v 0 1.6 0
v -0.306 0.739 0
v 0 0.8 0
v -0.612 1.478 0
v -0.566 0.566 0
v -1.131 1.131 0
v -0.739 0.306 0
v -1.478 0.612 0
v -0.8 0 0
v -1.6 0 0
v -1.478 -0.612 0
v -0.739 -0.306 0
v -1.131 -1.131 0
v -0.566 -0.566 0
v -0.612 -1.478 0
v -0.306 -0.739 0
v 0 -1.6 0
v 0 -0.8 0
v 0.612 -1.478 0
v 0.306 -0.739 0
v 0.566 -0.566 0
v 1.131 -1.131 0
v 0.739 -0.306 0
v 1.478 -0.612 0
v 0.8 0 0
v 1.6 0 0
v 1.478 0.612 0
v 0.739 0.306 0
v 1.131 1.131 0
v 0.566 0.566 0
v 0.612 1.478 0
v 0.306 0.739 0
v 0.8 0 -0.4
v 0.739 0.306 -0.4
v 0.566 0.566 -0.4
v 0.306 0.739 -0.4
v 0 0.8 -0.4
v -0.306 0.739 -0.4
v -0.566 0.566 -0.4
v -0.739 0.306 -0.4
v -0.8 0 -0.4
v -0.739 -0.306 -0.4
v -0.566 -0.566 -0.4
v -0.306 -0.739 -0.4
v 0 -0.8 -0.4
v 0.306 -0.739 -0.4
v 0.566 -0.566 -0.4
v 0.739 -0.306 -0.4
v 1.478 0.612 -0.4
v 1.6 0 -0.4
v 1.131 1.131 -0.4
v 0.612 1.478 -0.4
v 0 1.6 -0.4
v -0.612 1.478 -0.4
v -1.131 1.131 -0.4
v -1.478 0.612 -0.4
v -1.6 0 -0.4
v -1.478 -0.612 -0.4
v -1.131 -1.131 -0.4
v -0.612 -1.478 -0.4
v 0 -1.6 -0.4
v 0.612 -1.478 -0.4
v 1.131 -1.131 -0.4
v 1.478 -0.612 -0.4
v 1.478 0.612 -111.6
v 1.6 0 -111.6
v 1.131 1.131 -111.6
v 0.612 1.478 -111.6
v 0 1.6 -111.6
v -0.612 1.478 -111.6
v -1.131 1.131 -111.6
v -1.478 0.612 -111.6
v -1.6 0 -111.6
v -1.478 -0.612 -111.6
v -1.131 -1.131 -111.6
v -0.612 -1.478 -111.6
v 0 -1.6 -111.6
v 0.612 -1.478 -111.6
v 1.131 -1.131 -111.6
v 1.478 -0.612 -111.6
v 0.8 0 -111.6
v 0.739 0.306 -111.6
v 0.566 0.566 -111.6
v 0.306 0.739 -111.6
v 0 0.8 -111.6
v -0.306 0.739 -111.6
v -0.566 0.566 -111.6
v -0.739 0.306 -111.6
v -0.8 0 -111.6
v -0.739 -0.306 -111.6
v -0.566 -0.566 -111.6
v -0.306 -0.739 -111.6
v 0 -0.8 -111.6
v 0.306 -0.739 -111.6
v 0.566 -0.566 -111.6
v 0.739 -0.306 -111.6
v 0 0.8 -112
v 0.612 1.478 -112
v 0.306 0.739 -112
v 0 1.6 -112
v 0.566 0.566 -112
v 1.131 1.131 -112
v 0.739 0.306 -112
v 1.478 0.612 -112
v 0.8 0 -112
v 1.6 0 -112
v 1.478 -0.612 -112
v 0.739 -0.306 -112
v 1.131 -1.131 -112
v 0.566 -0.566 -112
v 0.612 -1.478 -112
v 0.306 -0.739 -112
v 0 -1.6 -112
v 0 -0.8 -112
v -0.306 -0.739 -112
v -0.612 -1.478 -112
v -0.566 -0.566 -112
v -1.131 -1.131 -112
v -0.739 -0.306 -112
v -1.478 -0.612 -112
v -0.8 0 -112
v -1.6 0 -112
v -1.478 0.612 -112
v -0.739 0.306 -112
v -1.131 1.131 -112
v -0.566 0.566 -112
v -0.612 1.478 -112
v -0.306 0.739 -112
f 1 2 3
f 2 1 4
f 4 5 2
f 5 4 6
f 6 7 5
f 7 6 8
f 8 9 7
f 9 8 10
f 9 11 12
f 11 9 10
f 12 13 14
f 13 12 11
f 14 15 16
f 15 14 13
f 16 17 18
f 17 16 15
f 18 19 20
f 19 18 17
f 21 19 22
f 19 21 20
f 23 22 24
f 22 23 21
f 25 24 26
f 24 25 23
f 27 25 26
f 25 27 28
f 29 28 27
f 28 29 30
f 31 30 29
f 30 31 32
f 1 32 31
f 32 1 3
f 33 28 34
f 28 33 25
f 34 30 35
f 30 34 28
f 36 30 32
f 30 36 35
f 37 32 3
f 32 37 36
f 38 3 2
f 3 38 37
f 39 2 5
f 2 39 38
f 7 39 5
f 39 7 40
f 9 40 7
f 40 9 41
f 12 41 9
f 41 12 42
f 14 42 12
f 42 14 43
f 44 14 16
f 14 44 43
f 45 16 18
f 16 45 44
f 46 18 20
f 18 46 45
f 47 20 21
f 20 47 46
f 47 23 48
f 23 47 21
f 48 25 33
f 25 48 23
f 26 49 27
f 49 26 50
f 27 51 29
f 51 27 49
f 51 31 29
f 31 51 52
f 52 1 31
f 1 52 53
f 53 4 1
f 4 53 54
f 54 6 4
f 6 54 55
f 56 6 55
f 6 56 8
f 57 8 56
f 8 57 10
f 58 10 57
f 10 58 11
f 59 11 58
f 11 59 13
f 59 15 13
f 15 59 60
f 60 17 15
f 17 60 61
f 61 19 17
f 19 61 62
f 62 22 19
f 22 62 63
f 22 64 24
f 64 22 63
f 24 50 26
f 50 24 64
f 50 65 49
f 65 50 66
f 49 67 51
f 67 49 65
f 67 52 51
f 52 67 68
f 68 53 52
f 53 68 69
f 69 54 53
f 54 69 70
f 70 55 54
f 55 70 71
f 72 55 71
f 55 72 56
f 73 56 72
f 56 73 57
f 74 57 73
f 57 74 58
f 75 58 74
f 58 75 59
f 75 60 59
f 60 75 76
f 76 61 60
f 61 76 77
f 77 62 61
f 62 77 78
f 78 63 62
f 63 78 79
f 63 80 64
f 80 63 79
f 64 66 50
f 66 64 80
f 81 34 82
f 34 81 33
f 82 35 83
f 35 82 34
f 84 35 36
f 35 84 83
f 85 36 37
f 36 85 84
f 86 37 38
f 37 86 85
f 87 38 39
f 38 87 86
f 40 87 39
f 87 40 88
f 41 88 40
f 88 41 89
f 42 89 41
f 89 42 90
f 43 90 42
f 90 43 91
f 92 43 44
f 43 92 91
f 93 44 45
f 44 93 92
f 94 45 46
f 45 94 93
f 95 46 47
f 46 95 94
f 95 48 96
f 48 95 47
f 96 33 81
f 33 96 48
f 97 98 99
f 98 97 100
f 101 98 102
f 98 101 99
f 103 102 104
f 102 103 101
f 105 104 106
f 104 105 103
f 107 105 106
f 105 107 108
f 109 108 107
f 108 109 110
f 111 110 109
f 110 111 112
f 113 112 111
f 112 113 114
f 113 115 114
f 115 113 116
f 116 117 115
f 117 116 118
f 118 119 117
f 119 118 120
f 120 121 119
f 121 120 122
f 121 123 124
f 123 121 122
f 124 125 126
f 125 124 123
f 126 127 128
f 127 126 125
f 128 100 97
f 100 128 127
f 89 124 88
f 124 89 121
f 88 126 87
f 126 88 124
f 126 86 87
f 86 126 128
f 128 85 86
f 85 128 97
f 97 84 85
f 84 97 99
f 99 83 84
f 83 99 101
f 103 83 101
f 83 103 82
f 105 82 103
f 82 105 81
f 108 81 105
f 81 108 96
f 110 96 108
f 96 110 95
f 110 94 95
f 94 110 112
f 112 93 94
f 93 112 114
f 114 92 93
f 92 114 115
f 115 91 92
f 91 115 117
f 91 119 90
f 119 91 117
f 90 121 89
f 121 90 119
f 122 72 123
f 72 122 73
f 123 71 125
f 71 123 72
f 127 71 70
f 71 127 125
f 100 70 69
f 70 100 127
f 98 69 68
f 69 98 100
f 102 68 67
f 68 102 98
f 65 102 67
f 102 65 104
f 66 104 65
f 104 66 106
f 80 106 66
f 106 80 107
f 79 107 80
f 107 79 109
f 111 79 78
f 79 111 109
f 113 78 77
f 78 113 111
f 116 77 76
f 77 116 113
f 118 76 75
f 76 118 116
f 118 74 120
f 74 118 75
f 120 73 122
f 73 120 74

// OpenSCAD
// file: ../p/4-4ring1.scad
use <../lib.scad>
function ldraw_lib__4_4ring1() = [
// 0 Ring  1 x 1.0
// 0 Name: 4-4ring1.dat
// 0 Author: James Jessiman
// 0 !LDRAW_ORG Primitive UPDATE 2009-01
// 0 !LICENSE Licensed under CC BY 4.0 : see CAreadme.txt
// 
// 0 BFC CERTIFY CCW
  [0,"BFC","CERTIFY"],
  [0,"BFC","CCW"],
// 
// 0 !HISTORY 1998-12-15 [PTadmin] Official Update 1998-10
// 0 !HISTORY 2002-04-08 [BrickCaster] Modified for BFC compliance
// 0 !HISTORY 2002-04-25 [PTadmin] Official Update 2002-02
// 0 !HISTORY 2007-06-24 [PTadmin] Header formatted for Contributor Agreement
// 0 !HISTORY 2008-07-01 [PTadmin] Official Update 2008-01
// 0 !HISTORY 2008-08-26 [cwdee] Switch polygon winding and rename
// 0 !HISTORY 2009-05-02 [PTadmin] Official Update 2009-01
// 
// 
// 4 16 -0.7654 0 1.8478 -0.3827 0 0.9239 0 0 1 0 0 2
  [4,16,-0.7654,0,1.8478,-0.3827,0,0.9239,0,0,1,0,0,2],
// 4 16 -1.4142 0 1.4142 -0.7071 0 0.7071 -0.3827 0 0.9239 -0.7654 0 1.8478
  [4,16,-1.4142,0,1.4142,-0.7071,0,0.7071,-0.3827,0,0.9239,-0.7654,0,1.8478],
// 4 16 -1.8478 0 0.7654 -0.9239 0 0.3827 -0.7071 0 0.7071 -1.4142 0 1.41420
  [4,16,-1.8478,0,0.7654,-0.9239,0,0.3827,-0.7071,0,0.7071,-1.4142,0,1.41420],
// 4 16 -2 0 0 -1 0 0 -0.9239 0 0.3827 -1.8478 0 0.7654
  [4,16,-2,0,0,-1,0,0,-0.9239,0,0.3827,-1.8478,0,0.7654],
// 4 16 -1.8478 0 -0.7654 -0.9239 0 -0.3827 -1 0 0 -2 0 0
  [4,16,-1.8478,0,-0.7654,-0.9239,0,-0.3827,-1,0,0,-2,0,0],
// 4 16 -1.4142 0 -1.4142 -0.7071 0 -0.7071 -0.9239 0 -0.3827 -1.8478 0 -0.7654
  [4,16,-1.4142,0,-1.4142,-0.7071,0,-0.7071,-0.9239,0,-0.3827,-1.8478,0,-0.7654],
// 4 16 -0.7654 0 -1.8478 -0.3827 0 -0.9239 -0.7071 0 -0.7071 -1.4142 0 -1.4142
  [4,16,-0.7654,0,-1.8478,-0.3827,0,-0.9239,-0.7071,0,-0.7071,-1.4142,0,-1.4142],
// 4 16 0 0 -2 0 0 -1 -0.3827 0 -0.9239 -0.7654 0 -1.8478
  [4,16,0,0,-2,0,0,-1,-0.3827,0,-0.9239,-0.7654,0,-1.8478],
// 4 16 0.7654 0 -1.8478 0.3827 0 -0.9239 0 0 -1 0 0 -2
  [4,16,0.7654,0,-1.8478,0.3827,0,-0.9239,0,0,-1,0,0,-2],
// 4 16 1.4142 0 -1.4142 0.7071 0 -0.7071 0.3827 0 -0.9239 0.7654 0 -1.8478
  [4,16,1.4142,0,-1.4142,0.7071,0,-0.7071,0.3827,0,-0.9239,0.7654,0,-1.8478],
// 4 16 1.8478 0 -0.7654 0.9239 0 -0.3827 0.7071 0 -0.7071 1.4142 0 -1.4142
  [4,16,1.8478,0,-0.7654,0.9239,0,-0.3827,0.7071,0,-0.7071,1.4142,0,-1.4142],
// 4 16 2 0 0 1 0 0 0.9239 0 -0.3827 1.8478 0 -0.7654
  [4,16,2,0,0,1,0,0,0.9239,0,-0.3827,1.8478,0,-0.7654],
// 4 16 1.8478 0 0.7654 0.9239 0 0.3827 1 0 0 2 0 0
  [4,16,1.8478,0,0.7654,0.9239,0,0.3827,1,0,0,2,0,0],
// 4 16 1.4142 0 1.4142 0.7071 0 0.7071 0.9239 0 0.3827 1.8478 0 0.7654
  [4,16,1.4142,0,1.4142,0.7071,0,0.7071,0.9239,0,0.3827,1.8478,0,0.7654],
// 4 16 0.7654 0 1.8478 0.3827 0 0.9239 0.7071 0 0.7071 1.4142 0 1.4142
  [4,16,0.7654,0,1.8478,0.3827,0,0.9239,0.7071,0,0.7071,1.4142,0,1.4142],
// 4 16 0 0 2 0 0 1 0.3827 0 0.9239 0.7654 0 1.8478
  [4,16,0,0,2,0,0,1,0.3827,0,0.9239,0.7654,0,1.8478],
// 0
];
module ldraw_lib__4_4ring1(step=0, col=false, unit=2/5, alt=false, line=0.2, solid=!$preview)
    makepoly(ldraw_lib__4_4ring1(), step=step, col=col, unit=unit, alt=alt, line=line, solid=solid);
ldraw_lib__4_4ring1(line=0.2);
// file: ../p/4-4edge.scad
use <../lib.scad>
function ldraw_lib__4_4edge() = [
// 0 Circle 1.0
// 0 Name: 4-4edge.dat
// 0 Author: James Jessiman
// 0 !LDRAW_ORG Primitive UPDATE 2017-01
// 0 !LICENSE Licensed under CC BY 4.0 : see CAreadme.txt
// 
// 0 BFC CERTIFY CCW
  [0,"BFC","CERTIFY"],
  [0,"BFC","CCW"],
// 
// 0 !HISTORY 1998-12-15 [PTadmin] Official Update 1998-10
// 0 !HISTORY 2005-12-28 [PTadmin] Official Update 2005-01
// 0 !HISTORY 2007-06-24 [PTadmin] Header formatted for Contributor Agreement
// 0 !HISTORY 2008-07-01 [PTadmin] Official Update 2008-01
// 0 !HISTORY 2017-01-15 [Steffen] BFCed
// 0 !HISTORY 2017-12-30 [PTadmin] Official Update 2017-01
// 
// 
// 2 24 1 0 0 0.9239 0 0.3827
  [2,24,1,0,0,0.9239,0,0.3827],
// 2 24 0.9239 0 0.3827 0.7071 0 0.7071
  [2,24,0.9239,0,0.3827,0.7071,0,0.7071],
// 2 24 0.7071 0 0.7071 0.3827 0 0.9239
  [2,24,0.7071,0,0.7071,0.3827,0,0.9239],
// 2 24 0.3827 0 0.9239 0 0 1
  [2,24,0.3827,0,0.9239,0,0,1],
// 2 24 0 0 1 -0.3827 0 0.9239
  [2,24,0,0,1,-0.3827,0,0.9239],
// 2 24 -0.3827 0 0.9239 -0.7071 0 0.7071
  [2,24,-0.3827,0,0.9239,-0.7071,0,0.7071],
// 2 24 -0.7071 0 0.7071 -0.9239 0 0.3827
  [2,24,-0.7071,0,0.7071,-0.9239,0,0.3827],
// 2 24 -0.9239 0 0.3827 -1 0 -0
  [2,24,-0.9239,0,0.3827,-1,0,-0],
// 2 24 -1 0 -0 -0.9239 0 -0.3827
  [2,24,-1,0,-0,-0.9239,0,-0.3827],
// 2 24 -0.9239 0 -0.3827 -0.7071 0 -0.7071
  [2,24,-0.9239,0,-0.3827,-0.7071,0,-0.7071],
// 2 24 -0.7071 0 -0.7071 -0.3827 0 -0.9239
  [2,24,-0.7071,0,-0.7071,-0.3827,0,-0.9239],
// 2 24 -0.3827 0 -0.9239 0 0 -1
  [2,24,-0.3827,0,-0.9239,0,0,-1],
// 2 24 0 0 -1 0.3827 0 -0.9239
  [2,24,0,0,-1,0.3827,0,-0.9239],
// 2 24 0.3827 0 -0.9239 0.7071 0 -0.7071
  [2,24,0.3827,0,-0.9239,0.7071,0,-0.7071],
// 2 24 0.7071 0 -0.7071 0.9239 0 -0.3827
  [2,24,0.7071,0,-0.7071,0.9239,0,-0.3827],
// 2 24 0.9239 0 -0.3827 1 0 0
  [2,24,0.9239,0,-0.3827,1,0,0],
];
module ldraw_lib__4_4edge(step=0, col=false, unit=2/5, alt=false, line=0.2, solid=!$preview)
    makepoly(ldraw_lib__4_4edge(), step=step, col=col, unit=unit, alt=alt, line=line, solid=solid);
ldraw_lib__4_4edge(line=0.2);
// file: ../p/4-4cyli.scad
use <../lib.scad>
function ldraw_lib__4_4cyli() = [
// 0 Cylinder 1.0
// 0 Name: 4-4cyli.dat
// 0 Author: James Jessiman
// 0 !LDRAW_ORG Primitive UPDATE 2005-01
// 0 !LICENSE Licensed under CC BY 4.0 : see CAreadme.txt
// 
// 0 BFC CERTIFY CCW
  [0,"BFC","CERTIFY"],
  [0,"BFC","CCW"],
// 
// 0 !HISTORY 1998-12-15 [PTadmin] Official Update 1998-10
// 0 !HISTORY 2002-03-23 [sbliss] Added BFC statement; merged headers from files in distributions LDraw 0.27 and Complete.
// 0 !HISTORY 2002-04-25 [PTadmin] Official Update 2002-02
// 0 !HISTORY 2004-12-14 [guyvivan] BFC CCW
// 0 !HISTORY 2005-12-28 [PTadmin] Official Update 2005-01
// 0 !HISTORY 2007-06-24 [PTadmin] Header formatted for Contributor Agreement
// 0 !HISTORY 2008-07-01 [PTadmin] Official Update 2008-01
// 
// 
// 4 16 1 1 0 0.9239 1 0.3827 0.9239 0 0.3827 1 0 0
  [4,16,1,1,0,0.9239,1,0.3827,0.9239,0,0.3827,1,0,0],
// 5 24 1 0 0 1 1 0 0.9239 0 0.3827 0.9239 0 -0.3827
  [5,24,1,0,0,1,1,0,0.9239,0,0.3827,0.9239,0,-0.3827],
// 4 16 0.9239 1 0.3827 0.7071 1 0.7071 0.7071 0 0.7071 0.9239 0 0.3827
  [4,16,0.9239,1,0.3827,0.7071,1,0.7071,0.7071,0,0.7071,0.9239,0,0.3827],
// 5 24 0.9239 0 0.3827 0.9239 1 0.3827 0.7071 0 0.7071 1 0 0
  [5,24,0.9239,0,0.3827,0.9239,1,0.3827,0.7071,0,0.7071,1,0,0],
// 4 16 0.7071 1 0.7071 0.3827 1 0.9239 0.3827 0 0.9239 0.7071 0 0.7071
  [4,16,0.7071,1,0.7071,0.3827,1,0.9239,0.3827,0,0.9239,0.7071,0,0.7071],
// 5 24 0.7071 0 0.7071 0.7071 1 0.7071 0.3827 0 0.9239 0.9239 0 0.3827
  [5,24,0.7071,0,0.7071,0.7071,1,0.7071,0.3827,0,0.9239,0.9239,0,0.3827],
// 4 16 0.3827 1 0.9239 0 1 1 0 0 1 0.3827 0 0.9239
  [4,16,0.3827,1,0.9239,0,1,1,0,0,1,0.3827,0,0.9239],
// 5 24 0.3827 0 0.9239 0.3827 1 0.9239 0 0 1 0.7071 0 0.7071
  [5,24,0.3827,0,0.9239,0.3827,1,0.9239,0,0,1,0.7071,0,0.7071],
// 4 16 0 1 1 -0.3827 1 0.9239 -0.3827 0 0.9239 0 0 1
  [4,16,0,1,1,-0.3827,1,0.9239,-0.3827,0,0.9239,0,0,1],
// 5 24 0 0 1 0 1 1 -0.3827 0 0.9239 0.3827 0 0.9239
  [5,24,0,0,1,0,1,1,-0.3827,0,0.9239,0.3827,0,0.9239],
// 4 16 -0.3827 1 0.9239 -0.7071 1 0.7071 -0.7071 0 0.7071 -0.3827 0 0.9239
  [4,16,-0.3827,1,0.9239,-0.7071,1,0.7071,-0.7071,0,0.7071,-0.3827,0,0.9239],
// 5 24 -0.3827 0 0.9239 -0.3827 1 0.9239 -0.7071 0 0.7071 0 0 1
  [5,24,-0.3827,0,0.9239,-0.3827,1,0.9239,-0.7071,0,0.7071,0,0,1],
// 4 16 -0.7071 1 0.7071 -0.9239 1 0.3827 -0.9239 0 0.3827 -0.7071 0 0.7071
  [4,16,-0.7071,1,0.7071,-0.9239,1,0.3827,-0.9239,0,0.3827,-0.7071,0,0.7071],
// 5 24 -0.7071 0 0.7071 -0.7071 1 0.7071 -0.9239 0 0.3827 -0.3827 0 0.9239
  [5,24,-0.7071,0,0.7071,-0.7071,1,0.7071,-0.9239,0,0.3827,-0.3827,0,0.9239],
// 4 16 -0.9239 1 0.3827 -1 1 0 -1 0 0 -0.9239 0 0.3827
  [4,16,-0.9239,1,0.3827,-1,1,0,-1,0,0,-0.9239,0,0.3827],
// 5 24 -0.9239 0 0.3827 -0.9239 1 0.3827 -1 0 0 -0.7071 0 0.7071
  [5,24,-0.9239,0,0.3827,-0.9239,1,0.3827,-1,0,0,-0.7071,0,0.7071],
// 4 16 -1 1 0 -0.9239 1 -0.3827 -0.9239 0 -0.3827 -1 0 0
  [4,16,-1,1,0,-0.9239,1,-0.3827,-0.9239,0,-0.3827,-1,0,0],
// 5 24 -1 0 0 -1 1 0 -0.9239 0 -0.3827 -0.9239 0 0.3827
  [5,24,-1,0,0,-1,1,0,-0.9239,0,-0.3827,-0.9239,0,0.3827],
// 4 16 -0.9239 1 -0.3827 -0.7071 1 -0.7071 -0.7071 0 -0.7071 -0.9239 0 -0.3827
  [4,16,-0.9239,1,-0.3827,-0.7071,1,-0.7071,-0.7071,0,-0.7071,-0.9239,0,-0.3827],
// 5 24 -0.9239 0 -0.3827 -0.9239 1 -0.3827 -0.7071 0 -0.7071 -1 0 0
  [5,24,-0.9239,0,-0.3827,-0.9239,1,-0.3827,-0.7071,0,-0.7071,-1,0,0],
// 4 16 -0.7071 1 -0.7071 -0.3827 1 -0.9239 -0.3827 0 -0.9239 -0.7071 0 -0.7071
  [4,16,-0.7071,1,-0.7071,-0.3827,1,-0.9239,-0.3827,0,-0.9239,-0.7071,0,-0.7071],
// 5 24 -0.7071 0 -0.7071 -0.7071 1 -0.7071 -0.3827 0 -0.9239 -0.9239 0 -0.3827
  [5,24,-0.7071,0,-0.7071,-0.7071,1,-0.7071,-0.3827,0,-0.9239,-0.9239,0,-0.3827],
// 4 16 -0.3827 1 -0.9239 0 1 -1 0 0 -1 -0.3827 0 -0.9239
  [4,16,-0.3827,1,-0.9239,0,1,-1,0,0,-1,-0.3827,0,-0.9239],
// 5 24 -0.3827 0 -0.9239 -0.3827 1 -0.9239 0 0 -1 -0.7071 0 -0.7071
  [5,24,-0.3827,0,-0.9239,-0.3827,1,-0.9239,0,0,-1,-0.7071,0,-0.7071],
// 4 16 0 1 -1 0.3827 1 -0.9239 0.3827 0 -0.9239 0 0 -1
  [4,16,0,1,-1,0.3827,1,-0.9239,0.3827,0,-0.9239,0,0,-1],
// 5 24 0 0 -1 0 1 -1 0.3827 0 -0.9239 -0.3827 0 -0.9239
  [5,24,0,0,-1,0,1,-1,0.3827,0,-0.9239,-0.3827,0,-0.9239],
// 4 16 0.3827 1 -0.9239 0.7071 1 -0.7071 0.7071 0 -0.7071 0.3827 0 -0.9239
  [4,16,0.3827,1,-0.9239,0.7071,1,-0.7071,0.7071,0,-0.7071,0.3827,0,-0.9239],
// 5 24 0.3827 0 -0.9239 0.3827 1 -0.9239 0.7071 0 -0.7071 0 0 -1
  [5,24,0.3827,0,-0.9239,0.3827,1,-0.9239,0.7071,0,-0.7071,0,0,-1],
// 4 16 0.7071 1 -0.7071 0.9239 1 -0.3827 0.9239 0 -0.3827 0.7071 0 -0.7071
  [4,16,0.7071,1,-0.7071,0.9239,1,-0.3827,0.9239,0,-0.3827,0.7071,0,-0.7071],
// 5 24 0.7071 0 -0.7071 0.7071 1 -0.7071 0.9239 0 -0.3827 0.3827 0 -0.9239
  [5,24,0.7071,0,-0.7071,0.7071,1,-0.7071,0.9239,0,-0.3827,0.3827,0,-0.9239],
// 4 16 0.9239 1 -0.3827 1 1 0 1 0 0 0.9239 0 -0.3827
  [4,16,0.9239,1,-0.3827,1,1,0,1,0,0,0.9239,0,-0.3827],
// 5 24 0.9239 0 -0.3827 0.9239 1 -0.3827 1 0 0 0.7071 0 -0.7071
  [5,24,0.9239,0,-0.3827,0.9239,1,-0.3827,1,0,0,0.7071,0,-0.7071],
// 0
];
module ldraw_lib__4_4cyli(step=0, col=false, unit=2/5, alt=false, line=0.2, solid=!$preview)
    makepoly(ldraw_lib__4_4cyli(), step=step, col=col, unit=unit, alt=alt, line=line, solid=solid);
ldraw_lib__4_4cyli(line=0.2);
// file: u9053.scad
use <../lib.scad>
use <../p/4-4cyli.scad>
use <../p/4-4edge.scad>
use <../p/4-4ring1.scad>
function ldraw_lib__u9053() = [
// 0 ~Technic Flex-System Hose End
// 0 Name: u9053.dat
// 0 Author: William Howard [WilliamH]
// 0 !LDRAW_ORG Part UPDATE 2011-02
// 0 !LICENSE Licensed under CC BY 2.0 and CC BY 4.0 : see CAreadme.txt
// 
// 0 BFC CERTIFY CCW
  [0,"BFC","CERTIFY"],
  [0,"BFC","CCW"],
// 
// 0 !HISTORY 2011-12-21 [cwdee] Reworked subparting technique
// 0 !HISTORY 2011-12-23 [PTadmin] Renamed from 76
// 0 !HISTORY 2011-12-29 [PTadmin] Official Update 2011-02
// 
// 
// 1 16 0 0 0 2 0 0 0 1 0 0 0 2 4-4ring1.dat
  [1,16,0,0,0,2,0,0,0,1,0,0,0,2, ldraw_lib__4_4ring1()],
// 1 16 0 0 0 2 0 0 0 1 0 0 0 2 4-4edge.dat
  [1,16,0,0,0,2,0,0,0,1,0,0,0,2, ldraw_lib__4_4edge()],
// 0 BFC INVERTNEXT
  [0,"BFC","INVERTNEXT"],
// 1 16 0 0 0 2 0 0 0 1 0 0 0 2 4-4cyli.dat
  [1,16,0,0,0,2,0,0,0,1,0,0,0,2, ldraw_lib__4_4cyli()],
// 1 16 0 0 0 4 0 0 0 1 0 0 0 4 4-4edge.dat
  [1,16,0,0,0,4,0,0,0,1,0,0,0,4, ldraw_lib__4_4edge()],
// 1 16 0 0 0 4 0 0 0 1 0 0 0 4 4-4cyli.dat
  [1,16,0,0,0,4,0,0,0,1,0,0,0,4, ldraw_lib__4_4cyli()],
// 0
];
module ldraw_lib__u9053(step=0, col=false, unit=2/5, alt=false, line=0.2, solid=!$preview)
    makepoly(ldraw_lib__u9053(), step=step, col=col, unit=unit, alt=alt, line=line, solid=solid);
ldraw_lib__u9053(line=0.2);
// file: 77.scad
use <../lib.scad>
use <../p/4-4cyli.scad>
function ldraw_lib__77() = [
// 0 ~Technic Flex-System Hose Segment
// 0 Name: 77.dat
// 0 Author: William Howard [WilliamH]
// 0 !LDRAW_ORG Part UPDATE 2011-02
// 0 !LICENSE Licensed under CC BY 2.0 and CC BY 4.0 : see CAreadme.txt
// 
// 0 BFC CERTIFY CCW
  [0,"BFC","CERTIFY"],
  [0,"BFC","CCW"],
// 
// 0 !HISTORY 2011-12-21 [cwdee] Reworked subparting technique
// 0 !HISTORY 2011-12-29 [PTadmin] Official Update 2011-02
// 
// 
// 1 16 0 0 0 4 0 0 0 1 0 0 0 4 4-4cyli.dat
  [1,16,0,0,0,4,0,0,0,1,0,0,0,4, ldraw_lib__4_4cyli()],
// 0 BFC INVERTNEXT
  [0,"BFC","INVERTNEXT"],
// 1 16 0 0 0 2 0 0 0 1 0 0 0 2 4-4cyli.dat
  [1,16,0,0,0,2,0,0,0,1,0,0,0,2, ldraw_lib__4_4cyli()],
// 0
];
module ldraw_lib__77(step=0, col=false, unit=2/5, alt=false, line=0.2, solid=!$preview)
    makepoly(ldraw_lib__77(), step=step, col=col, unit=unit, alt=alt, line=line, solid=solid);
ldraw_lib__77(line=0.2);
// main file
use <../lib.scad>
use <77.scad>
use <u9053.scad>
function ldraw_lib__71177() = [
// 0 Technic Flex-System Hose 14L (280LDU)
// 0 Name: 71177.dat
// 0 Author: Tim Gould [timgould]
// 0 !LDRAW_ORG Part UPDATE 2011-02
// 0 !LICENSE Licensed under CC BY 4.0 : see CAreadme.txt
// 
// 0 BFC CERTIFY CCW
  [0,"BFC","CERTIFY"],
  [0,"BFC","CCW"],
// 
// 0 !KEYWORDS bar, BrickLink 75c14, Rebrickable 75c14, tube
// 
// 0 !HISTORY 2011-12-29 [PTadmin] Official Update 2011-02
// 
// 
// 1 16 0 0 0 1 0 0 0 1 0 0 0 1 u9053.dat
  [1,16,0,0,0,1,0,0,0,1,0,0,0,1, ldraw_lib__u9053()],
// 1 16 0 1 0 1 0 0 0 278 0 0 0 1 77.dat
  [1,16,0,1,0,1,0,0,0,278,0,0,0,1, ldraw_lib__77()],
// 1 16 0 280 0 -1 0 0 0 -1 0 0 0 1 u9053.dat
  [1,16,0,280,0,-1,0,0,0,-1,0,0,0,1, ldraw_lib__u9053()],
];
module ldraw_lib__71177(step=0, col=false, unit=2/5, alt=false, line=0.2, solid=!$preview)
    makepoly(ldraw_lib__71177(), step=step, col=col, unit=unit, alt=alt, line=line, solid=solid);
ldraw_lib__71177(line=0.2);
